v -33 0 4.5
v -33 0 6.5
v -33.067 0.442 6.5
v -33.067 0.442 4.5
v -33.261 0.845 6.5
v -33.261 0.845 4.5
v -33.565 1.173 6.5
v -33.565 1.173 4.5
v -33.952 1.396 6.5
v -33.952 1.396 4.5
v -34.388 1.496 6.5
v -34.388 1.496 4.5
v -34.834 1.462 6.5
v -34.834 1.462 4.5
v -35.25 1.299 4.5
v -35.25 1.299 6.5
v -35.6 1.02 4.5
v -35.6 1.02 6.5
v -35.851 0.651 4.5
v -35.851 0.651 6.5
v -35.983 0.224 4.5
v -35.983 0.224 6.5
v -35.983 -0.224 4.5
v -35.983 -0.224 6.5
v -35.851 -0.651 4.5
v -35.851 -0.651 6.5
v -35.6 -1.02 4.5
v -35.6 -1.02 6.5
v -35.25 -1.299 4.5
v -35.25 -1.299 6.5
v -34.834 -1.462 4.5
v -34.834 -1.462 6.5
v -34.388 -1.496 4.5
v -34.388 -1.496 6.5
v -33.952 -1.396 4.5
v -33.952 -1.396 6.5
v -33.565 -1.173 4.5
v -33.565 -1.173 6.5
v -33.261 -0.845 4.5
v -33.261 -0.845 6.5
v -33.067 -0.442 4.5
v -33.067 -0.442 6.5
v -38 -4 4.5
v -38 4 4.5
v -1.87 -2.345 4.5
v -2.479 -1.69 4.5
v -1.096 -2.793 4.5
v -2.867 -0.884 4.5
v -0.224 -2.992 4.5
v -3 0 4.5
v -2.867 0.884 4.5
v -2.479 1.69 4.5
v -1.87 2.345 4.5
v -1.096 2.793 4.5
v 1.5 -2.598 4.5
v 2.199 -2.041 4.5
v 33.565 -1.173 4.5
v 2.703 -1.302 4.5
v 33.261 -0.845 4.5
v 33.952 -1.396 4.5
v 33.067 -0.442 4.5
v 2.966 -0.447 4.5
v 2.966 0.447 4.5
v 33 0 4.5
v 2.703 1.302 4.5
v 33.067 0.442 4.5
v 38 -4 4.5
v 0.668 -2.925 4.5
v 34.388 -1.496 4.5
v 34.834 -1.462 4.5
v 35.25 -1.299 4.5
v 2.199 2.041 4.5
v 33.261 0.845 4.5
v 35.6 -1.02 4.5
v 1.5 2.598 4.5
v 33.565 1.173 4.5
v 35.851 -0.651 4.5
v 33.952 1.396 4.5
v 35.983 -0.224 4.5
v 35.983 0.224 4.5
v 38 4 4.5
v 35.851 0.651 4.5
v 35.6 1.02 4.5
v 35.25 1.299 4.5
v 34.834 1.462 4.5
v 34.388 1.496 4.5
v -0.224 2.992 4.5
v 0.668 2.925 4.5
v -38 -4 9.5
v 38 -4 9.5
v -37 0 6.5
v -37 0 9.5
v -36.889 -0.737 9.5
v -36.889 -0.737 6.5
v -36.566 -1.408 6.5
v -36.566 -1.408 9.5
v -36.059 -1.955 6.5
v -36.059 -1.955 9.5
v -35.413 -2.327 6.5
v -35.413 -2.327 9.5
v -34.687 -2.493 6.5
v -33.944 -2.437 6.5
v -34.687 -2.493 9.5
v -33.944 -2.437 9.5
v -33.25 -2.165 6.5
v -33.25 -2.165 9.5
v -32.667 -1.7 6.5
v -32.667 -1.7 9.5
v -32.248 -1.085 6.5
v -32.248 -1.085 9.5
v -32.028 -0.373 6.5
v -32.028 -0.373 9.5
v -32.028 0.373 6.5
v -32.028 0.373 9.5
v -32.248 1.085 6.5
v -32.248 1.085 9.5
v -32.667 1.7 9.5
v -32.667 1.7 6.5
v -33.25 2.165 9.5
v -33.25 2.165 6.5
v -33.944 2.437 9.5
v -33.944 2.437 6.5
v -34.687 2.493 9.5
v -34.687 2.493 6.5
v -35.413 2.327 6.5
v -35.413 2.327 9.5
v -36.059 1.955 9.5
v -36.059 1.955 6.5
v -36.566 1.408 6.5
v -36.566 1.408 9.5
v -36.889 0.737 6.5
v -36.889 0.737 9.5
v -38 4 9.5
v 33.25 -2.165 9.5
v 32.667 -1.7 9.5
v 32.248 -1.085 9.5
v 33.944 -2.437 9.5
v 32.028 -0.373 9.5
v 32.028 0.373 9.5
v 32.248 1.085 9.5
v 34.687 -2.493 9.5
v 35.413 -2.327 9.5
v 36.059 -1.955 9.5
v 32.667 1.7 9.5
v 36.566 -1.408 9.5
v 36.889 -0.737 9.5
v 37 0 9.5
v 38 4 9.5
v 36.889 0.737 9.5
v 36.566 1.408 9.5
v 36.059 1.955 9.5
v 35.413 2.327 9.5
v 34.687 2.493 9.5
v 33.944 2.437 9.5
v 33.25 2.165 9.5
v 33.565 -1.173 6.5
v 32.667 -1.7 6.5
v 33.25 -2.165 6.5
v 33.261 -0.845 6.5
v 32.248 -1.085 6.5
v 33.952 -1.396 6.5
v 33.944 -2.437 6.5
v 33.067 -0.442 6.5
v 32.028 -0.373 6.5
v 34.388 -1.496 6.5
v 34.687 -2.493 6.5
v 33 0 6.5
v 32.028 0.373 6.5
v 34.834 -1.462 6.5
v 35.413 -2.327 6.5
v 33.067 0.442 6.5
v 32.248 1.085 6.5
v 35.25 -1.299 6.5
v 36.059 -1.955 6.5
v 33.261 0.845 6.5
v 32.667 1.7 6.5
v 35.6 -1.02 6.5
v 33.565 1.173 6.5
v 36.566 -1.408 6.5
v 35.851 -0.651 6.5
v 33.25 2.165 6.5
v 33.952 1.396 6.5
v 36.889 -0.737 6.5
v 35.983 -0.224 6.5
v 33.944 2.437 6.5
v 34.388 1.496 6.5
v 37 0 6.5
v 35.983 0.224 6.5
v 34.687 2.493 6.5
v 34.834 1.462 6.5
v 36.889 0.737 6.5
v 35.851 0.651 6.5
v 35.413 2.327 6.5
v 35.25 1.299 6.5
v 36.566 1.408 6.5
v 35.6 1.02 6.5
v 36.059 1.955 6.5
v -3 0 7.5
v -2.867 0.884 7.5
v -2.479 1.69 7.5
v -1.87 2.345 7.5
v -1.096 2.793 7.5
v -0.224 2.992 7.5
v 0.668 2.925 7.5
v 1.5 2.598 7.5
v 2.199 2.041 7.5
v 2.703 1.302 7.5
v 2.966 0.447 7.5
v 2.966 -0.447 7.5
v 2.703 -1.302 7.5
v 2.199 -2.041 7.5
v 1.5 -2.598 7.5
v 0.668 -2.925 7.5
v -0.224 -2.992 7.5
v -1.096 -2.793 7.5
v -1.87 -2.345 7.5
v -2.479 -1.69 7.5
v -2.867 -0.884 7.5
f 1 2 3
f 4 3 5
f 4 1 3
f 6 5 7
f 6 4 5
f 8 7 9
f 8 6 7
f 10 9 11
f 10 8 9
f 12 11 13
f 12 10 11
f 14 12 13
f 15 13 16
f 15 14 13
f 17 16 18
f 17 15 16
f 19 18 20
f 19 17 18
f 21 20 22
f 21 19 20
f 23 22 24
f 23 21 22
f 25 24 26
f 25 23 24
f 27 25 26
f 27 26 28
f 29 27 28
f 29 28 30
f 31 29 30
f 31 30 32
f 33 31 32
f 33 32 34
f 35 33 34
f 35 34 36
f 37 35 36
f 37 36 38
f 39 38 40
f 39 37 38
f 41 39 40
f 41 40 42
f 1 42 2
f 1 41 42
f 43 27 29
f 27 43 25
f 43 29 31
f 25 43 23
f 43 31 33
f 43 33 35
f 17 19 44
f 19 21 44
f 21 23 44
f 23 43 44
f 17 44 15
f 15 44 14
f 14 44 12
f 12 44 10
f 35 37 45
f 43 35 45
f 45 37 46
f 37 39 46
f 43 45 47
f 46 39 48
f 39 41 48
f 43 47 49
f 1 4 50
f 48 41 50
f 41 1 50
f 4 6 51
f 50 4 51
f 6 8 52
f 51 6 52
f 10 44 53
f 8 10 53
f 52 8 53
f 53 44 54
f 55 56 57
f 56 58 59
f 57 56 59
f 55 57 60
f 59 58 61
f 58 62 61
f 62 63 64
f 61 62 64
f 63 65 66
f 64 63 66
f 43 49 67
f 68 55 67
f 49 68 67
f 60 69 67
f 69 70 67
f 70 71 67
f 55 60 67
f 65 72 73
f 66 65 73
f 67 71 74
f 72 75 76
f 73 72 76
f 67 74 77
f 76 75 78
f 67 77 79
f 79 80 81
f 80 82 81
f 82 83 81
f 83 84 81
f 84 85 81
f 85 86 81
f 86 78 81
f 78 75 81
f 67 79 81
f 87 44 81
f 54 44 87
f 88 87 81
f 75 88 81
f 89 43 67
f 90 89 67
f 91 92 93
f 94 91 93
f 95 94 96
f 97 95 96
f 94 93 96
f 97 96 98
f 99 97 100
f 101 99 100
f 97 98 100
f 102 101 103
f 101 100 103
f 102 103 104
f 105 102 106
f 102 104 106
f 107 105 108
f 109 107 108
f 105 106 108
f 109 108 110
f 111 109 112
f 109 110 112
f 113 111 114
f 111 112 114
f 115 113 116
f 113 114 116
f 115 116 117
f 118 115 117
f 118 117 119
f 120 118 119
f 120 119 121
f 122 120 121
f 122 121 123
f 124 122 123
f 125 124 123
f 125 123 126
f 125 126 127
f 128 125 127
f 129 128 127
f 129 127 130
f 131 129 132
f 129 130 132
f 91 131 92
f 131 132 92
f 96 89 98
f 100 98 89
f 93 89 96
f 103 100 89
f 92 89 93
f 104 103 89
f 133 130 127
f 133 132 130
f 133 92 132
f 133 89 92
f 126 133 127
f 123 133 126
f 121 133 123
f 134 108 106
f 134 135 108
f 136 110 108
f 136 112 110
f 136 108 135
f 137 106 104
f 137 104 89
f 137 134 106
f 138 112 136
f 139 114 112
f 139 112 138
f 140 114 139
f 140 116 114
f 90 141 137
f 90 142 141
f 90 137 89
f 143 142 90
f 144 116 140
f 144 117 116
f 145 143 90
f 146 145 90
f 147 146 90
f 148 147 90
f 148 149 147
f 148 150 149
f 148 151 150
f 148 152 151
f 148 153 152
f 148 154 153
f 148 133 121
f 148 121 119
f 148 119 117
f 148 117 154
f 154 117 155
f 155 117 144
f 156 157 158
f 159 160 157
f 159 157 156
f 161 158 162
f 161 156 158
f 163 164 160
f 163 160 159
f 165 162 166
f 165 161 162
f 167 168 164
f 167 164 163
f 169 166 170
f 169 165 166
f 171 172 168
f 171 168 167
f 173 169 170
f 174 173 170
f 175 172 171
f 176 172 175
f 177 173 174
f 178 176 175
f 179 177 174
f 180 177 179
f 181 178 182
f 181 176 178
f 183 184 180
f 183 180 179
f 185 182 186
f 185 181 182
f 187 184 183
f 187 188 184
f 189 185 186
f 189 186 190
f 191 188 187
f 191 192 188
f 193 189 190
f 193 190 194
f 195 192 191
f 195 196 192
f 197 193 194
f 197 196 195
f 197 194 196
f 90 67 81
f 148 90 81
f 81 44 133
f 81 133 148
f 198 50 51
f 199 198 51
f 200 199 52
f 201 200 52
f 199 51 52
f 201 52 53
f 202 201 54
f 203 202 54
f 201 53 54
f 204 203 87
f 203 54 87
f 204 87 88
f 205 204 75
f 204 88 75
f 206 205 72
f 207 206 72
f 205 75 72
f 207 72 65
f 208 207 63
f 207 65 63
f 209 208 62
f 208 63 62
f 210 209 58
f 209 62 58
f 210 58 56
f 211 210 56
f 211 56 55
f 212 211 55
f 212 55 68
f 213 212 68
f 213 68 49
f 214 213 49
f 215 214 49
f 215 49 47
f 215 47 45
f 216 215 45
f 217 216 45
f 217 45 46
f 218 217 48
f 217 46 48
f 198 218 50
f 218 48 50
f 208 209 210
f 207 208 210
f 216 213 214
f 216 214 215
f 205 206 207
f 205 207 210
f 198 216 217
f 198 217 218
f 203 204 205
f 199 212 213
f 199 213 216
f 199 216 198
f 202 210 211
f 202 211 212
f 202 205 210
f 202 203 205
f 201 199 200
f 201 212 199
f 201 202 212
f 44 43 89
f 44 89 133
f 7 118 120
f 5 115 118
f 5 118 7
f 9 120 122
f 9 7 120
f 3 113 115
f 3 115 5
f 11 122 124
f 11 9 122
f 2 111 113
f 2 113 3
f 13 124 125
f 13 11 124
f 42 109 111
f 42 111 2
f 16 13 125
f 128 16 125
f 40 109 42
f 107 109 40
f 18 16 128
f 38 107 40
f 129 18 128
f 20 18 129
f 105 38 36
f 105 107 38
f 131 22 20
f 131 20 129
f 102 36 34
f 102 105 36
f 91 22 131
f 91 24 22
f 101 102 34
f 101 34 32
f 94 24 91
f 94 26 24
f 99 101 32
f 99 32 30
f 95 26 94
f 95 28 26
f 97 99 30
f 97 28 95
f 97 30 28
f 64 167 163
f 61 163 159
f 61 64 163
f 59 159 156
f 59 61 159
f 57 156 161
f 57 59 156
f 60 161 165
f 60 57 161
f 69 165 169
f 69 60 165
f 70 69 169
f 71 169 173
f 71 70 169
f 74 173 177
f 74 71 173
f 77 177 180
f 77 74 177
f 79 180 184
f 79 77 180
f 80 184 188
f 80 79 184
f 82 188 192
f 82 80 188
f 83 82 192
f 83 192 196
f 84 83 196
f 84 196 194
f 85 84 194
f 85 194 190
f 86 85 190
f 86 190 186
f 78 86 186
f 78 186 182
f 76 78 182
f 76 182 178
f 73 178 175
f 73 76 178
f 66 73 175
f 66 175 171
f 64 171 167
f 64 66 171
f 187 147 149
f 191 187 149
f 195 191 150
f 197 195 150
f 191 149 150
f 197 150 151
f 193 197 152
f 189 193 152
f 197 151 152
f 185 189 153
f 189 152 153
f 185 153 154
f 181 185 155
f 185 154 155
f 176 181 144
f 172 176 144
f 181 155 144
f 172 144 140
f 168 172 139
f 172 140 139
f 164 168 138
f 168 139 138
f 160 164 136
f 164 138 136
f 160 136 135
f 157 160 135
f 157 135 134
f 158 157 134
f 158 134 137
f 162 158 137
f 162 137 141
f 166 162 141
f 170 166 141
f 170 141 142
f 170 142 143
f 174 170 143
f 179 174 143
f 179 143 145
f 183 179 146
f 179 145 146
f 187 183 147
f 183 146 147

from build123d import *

# Parameters (mm, degrees)
SKETCH3_W           = 76
SKETCH3_H           = 8
SKETCH3_R           = 1.5
BOSS_EXTRUDE1_DEPTH = 5
SKETCH4_R           = 3
CUT_EXTRUDE1_DEPTH  = 3
SKETCH5_R           = 2.5
CUT_EXTRUDE2_DEPTH  = 3


with BuildPart() as part:
    # Sketch3 → Boss-Extrude1 (new body)
    with BuildSketch(Plane.XY.offset(4.5)):
        Rectangle(SKETCH3_W, SKETCH3_H)
        with Locations((-34.5, 0)):
            Circle(SKETCH3_R, mode=Mode.SUBTRACT)
        with Locations((34.5, 0)):
            Circle(SKETCH3_R, mode=Mode.SUBTRACT)
    extrude(amount=BOSS_EXTRUDE1_DEPTH)

    # Sketch4 → Cut-Extrude1 (cut)
    with BuildSketch(Plane(origin=(0, 0, 4.5), x_dir=(-1, 0, 0), z_dir=(0, 0, -1))):
        Circle(SKETCH4_R)
    extrude(amount=-CUT_EXTRUDE1_DEPTH, mode=Mode.SUBTRACT)

    # Sketch5 → Cut-Extrude2 (cut)
    with BuildSketch(Plane.XY.offset(9.5)):
        with Locations((34.5, 0)):
            Circle(SKETCH5_R)
        with Locations((-34.5, 0)):
            Circle(SKETCH5_R)
    extrude(amount=-CUT_EXTRUDE2_DEPTH, mode=Mode.SUBTRACT)


solid = part.part
